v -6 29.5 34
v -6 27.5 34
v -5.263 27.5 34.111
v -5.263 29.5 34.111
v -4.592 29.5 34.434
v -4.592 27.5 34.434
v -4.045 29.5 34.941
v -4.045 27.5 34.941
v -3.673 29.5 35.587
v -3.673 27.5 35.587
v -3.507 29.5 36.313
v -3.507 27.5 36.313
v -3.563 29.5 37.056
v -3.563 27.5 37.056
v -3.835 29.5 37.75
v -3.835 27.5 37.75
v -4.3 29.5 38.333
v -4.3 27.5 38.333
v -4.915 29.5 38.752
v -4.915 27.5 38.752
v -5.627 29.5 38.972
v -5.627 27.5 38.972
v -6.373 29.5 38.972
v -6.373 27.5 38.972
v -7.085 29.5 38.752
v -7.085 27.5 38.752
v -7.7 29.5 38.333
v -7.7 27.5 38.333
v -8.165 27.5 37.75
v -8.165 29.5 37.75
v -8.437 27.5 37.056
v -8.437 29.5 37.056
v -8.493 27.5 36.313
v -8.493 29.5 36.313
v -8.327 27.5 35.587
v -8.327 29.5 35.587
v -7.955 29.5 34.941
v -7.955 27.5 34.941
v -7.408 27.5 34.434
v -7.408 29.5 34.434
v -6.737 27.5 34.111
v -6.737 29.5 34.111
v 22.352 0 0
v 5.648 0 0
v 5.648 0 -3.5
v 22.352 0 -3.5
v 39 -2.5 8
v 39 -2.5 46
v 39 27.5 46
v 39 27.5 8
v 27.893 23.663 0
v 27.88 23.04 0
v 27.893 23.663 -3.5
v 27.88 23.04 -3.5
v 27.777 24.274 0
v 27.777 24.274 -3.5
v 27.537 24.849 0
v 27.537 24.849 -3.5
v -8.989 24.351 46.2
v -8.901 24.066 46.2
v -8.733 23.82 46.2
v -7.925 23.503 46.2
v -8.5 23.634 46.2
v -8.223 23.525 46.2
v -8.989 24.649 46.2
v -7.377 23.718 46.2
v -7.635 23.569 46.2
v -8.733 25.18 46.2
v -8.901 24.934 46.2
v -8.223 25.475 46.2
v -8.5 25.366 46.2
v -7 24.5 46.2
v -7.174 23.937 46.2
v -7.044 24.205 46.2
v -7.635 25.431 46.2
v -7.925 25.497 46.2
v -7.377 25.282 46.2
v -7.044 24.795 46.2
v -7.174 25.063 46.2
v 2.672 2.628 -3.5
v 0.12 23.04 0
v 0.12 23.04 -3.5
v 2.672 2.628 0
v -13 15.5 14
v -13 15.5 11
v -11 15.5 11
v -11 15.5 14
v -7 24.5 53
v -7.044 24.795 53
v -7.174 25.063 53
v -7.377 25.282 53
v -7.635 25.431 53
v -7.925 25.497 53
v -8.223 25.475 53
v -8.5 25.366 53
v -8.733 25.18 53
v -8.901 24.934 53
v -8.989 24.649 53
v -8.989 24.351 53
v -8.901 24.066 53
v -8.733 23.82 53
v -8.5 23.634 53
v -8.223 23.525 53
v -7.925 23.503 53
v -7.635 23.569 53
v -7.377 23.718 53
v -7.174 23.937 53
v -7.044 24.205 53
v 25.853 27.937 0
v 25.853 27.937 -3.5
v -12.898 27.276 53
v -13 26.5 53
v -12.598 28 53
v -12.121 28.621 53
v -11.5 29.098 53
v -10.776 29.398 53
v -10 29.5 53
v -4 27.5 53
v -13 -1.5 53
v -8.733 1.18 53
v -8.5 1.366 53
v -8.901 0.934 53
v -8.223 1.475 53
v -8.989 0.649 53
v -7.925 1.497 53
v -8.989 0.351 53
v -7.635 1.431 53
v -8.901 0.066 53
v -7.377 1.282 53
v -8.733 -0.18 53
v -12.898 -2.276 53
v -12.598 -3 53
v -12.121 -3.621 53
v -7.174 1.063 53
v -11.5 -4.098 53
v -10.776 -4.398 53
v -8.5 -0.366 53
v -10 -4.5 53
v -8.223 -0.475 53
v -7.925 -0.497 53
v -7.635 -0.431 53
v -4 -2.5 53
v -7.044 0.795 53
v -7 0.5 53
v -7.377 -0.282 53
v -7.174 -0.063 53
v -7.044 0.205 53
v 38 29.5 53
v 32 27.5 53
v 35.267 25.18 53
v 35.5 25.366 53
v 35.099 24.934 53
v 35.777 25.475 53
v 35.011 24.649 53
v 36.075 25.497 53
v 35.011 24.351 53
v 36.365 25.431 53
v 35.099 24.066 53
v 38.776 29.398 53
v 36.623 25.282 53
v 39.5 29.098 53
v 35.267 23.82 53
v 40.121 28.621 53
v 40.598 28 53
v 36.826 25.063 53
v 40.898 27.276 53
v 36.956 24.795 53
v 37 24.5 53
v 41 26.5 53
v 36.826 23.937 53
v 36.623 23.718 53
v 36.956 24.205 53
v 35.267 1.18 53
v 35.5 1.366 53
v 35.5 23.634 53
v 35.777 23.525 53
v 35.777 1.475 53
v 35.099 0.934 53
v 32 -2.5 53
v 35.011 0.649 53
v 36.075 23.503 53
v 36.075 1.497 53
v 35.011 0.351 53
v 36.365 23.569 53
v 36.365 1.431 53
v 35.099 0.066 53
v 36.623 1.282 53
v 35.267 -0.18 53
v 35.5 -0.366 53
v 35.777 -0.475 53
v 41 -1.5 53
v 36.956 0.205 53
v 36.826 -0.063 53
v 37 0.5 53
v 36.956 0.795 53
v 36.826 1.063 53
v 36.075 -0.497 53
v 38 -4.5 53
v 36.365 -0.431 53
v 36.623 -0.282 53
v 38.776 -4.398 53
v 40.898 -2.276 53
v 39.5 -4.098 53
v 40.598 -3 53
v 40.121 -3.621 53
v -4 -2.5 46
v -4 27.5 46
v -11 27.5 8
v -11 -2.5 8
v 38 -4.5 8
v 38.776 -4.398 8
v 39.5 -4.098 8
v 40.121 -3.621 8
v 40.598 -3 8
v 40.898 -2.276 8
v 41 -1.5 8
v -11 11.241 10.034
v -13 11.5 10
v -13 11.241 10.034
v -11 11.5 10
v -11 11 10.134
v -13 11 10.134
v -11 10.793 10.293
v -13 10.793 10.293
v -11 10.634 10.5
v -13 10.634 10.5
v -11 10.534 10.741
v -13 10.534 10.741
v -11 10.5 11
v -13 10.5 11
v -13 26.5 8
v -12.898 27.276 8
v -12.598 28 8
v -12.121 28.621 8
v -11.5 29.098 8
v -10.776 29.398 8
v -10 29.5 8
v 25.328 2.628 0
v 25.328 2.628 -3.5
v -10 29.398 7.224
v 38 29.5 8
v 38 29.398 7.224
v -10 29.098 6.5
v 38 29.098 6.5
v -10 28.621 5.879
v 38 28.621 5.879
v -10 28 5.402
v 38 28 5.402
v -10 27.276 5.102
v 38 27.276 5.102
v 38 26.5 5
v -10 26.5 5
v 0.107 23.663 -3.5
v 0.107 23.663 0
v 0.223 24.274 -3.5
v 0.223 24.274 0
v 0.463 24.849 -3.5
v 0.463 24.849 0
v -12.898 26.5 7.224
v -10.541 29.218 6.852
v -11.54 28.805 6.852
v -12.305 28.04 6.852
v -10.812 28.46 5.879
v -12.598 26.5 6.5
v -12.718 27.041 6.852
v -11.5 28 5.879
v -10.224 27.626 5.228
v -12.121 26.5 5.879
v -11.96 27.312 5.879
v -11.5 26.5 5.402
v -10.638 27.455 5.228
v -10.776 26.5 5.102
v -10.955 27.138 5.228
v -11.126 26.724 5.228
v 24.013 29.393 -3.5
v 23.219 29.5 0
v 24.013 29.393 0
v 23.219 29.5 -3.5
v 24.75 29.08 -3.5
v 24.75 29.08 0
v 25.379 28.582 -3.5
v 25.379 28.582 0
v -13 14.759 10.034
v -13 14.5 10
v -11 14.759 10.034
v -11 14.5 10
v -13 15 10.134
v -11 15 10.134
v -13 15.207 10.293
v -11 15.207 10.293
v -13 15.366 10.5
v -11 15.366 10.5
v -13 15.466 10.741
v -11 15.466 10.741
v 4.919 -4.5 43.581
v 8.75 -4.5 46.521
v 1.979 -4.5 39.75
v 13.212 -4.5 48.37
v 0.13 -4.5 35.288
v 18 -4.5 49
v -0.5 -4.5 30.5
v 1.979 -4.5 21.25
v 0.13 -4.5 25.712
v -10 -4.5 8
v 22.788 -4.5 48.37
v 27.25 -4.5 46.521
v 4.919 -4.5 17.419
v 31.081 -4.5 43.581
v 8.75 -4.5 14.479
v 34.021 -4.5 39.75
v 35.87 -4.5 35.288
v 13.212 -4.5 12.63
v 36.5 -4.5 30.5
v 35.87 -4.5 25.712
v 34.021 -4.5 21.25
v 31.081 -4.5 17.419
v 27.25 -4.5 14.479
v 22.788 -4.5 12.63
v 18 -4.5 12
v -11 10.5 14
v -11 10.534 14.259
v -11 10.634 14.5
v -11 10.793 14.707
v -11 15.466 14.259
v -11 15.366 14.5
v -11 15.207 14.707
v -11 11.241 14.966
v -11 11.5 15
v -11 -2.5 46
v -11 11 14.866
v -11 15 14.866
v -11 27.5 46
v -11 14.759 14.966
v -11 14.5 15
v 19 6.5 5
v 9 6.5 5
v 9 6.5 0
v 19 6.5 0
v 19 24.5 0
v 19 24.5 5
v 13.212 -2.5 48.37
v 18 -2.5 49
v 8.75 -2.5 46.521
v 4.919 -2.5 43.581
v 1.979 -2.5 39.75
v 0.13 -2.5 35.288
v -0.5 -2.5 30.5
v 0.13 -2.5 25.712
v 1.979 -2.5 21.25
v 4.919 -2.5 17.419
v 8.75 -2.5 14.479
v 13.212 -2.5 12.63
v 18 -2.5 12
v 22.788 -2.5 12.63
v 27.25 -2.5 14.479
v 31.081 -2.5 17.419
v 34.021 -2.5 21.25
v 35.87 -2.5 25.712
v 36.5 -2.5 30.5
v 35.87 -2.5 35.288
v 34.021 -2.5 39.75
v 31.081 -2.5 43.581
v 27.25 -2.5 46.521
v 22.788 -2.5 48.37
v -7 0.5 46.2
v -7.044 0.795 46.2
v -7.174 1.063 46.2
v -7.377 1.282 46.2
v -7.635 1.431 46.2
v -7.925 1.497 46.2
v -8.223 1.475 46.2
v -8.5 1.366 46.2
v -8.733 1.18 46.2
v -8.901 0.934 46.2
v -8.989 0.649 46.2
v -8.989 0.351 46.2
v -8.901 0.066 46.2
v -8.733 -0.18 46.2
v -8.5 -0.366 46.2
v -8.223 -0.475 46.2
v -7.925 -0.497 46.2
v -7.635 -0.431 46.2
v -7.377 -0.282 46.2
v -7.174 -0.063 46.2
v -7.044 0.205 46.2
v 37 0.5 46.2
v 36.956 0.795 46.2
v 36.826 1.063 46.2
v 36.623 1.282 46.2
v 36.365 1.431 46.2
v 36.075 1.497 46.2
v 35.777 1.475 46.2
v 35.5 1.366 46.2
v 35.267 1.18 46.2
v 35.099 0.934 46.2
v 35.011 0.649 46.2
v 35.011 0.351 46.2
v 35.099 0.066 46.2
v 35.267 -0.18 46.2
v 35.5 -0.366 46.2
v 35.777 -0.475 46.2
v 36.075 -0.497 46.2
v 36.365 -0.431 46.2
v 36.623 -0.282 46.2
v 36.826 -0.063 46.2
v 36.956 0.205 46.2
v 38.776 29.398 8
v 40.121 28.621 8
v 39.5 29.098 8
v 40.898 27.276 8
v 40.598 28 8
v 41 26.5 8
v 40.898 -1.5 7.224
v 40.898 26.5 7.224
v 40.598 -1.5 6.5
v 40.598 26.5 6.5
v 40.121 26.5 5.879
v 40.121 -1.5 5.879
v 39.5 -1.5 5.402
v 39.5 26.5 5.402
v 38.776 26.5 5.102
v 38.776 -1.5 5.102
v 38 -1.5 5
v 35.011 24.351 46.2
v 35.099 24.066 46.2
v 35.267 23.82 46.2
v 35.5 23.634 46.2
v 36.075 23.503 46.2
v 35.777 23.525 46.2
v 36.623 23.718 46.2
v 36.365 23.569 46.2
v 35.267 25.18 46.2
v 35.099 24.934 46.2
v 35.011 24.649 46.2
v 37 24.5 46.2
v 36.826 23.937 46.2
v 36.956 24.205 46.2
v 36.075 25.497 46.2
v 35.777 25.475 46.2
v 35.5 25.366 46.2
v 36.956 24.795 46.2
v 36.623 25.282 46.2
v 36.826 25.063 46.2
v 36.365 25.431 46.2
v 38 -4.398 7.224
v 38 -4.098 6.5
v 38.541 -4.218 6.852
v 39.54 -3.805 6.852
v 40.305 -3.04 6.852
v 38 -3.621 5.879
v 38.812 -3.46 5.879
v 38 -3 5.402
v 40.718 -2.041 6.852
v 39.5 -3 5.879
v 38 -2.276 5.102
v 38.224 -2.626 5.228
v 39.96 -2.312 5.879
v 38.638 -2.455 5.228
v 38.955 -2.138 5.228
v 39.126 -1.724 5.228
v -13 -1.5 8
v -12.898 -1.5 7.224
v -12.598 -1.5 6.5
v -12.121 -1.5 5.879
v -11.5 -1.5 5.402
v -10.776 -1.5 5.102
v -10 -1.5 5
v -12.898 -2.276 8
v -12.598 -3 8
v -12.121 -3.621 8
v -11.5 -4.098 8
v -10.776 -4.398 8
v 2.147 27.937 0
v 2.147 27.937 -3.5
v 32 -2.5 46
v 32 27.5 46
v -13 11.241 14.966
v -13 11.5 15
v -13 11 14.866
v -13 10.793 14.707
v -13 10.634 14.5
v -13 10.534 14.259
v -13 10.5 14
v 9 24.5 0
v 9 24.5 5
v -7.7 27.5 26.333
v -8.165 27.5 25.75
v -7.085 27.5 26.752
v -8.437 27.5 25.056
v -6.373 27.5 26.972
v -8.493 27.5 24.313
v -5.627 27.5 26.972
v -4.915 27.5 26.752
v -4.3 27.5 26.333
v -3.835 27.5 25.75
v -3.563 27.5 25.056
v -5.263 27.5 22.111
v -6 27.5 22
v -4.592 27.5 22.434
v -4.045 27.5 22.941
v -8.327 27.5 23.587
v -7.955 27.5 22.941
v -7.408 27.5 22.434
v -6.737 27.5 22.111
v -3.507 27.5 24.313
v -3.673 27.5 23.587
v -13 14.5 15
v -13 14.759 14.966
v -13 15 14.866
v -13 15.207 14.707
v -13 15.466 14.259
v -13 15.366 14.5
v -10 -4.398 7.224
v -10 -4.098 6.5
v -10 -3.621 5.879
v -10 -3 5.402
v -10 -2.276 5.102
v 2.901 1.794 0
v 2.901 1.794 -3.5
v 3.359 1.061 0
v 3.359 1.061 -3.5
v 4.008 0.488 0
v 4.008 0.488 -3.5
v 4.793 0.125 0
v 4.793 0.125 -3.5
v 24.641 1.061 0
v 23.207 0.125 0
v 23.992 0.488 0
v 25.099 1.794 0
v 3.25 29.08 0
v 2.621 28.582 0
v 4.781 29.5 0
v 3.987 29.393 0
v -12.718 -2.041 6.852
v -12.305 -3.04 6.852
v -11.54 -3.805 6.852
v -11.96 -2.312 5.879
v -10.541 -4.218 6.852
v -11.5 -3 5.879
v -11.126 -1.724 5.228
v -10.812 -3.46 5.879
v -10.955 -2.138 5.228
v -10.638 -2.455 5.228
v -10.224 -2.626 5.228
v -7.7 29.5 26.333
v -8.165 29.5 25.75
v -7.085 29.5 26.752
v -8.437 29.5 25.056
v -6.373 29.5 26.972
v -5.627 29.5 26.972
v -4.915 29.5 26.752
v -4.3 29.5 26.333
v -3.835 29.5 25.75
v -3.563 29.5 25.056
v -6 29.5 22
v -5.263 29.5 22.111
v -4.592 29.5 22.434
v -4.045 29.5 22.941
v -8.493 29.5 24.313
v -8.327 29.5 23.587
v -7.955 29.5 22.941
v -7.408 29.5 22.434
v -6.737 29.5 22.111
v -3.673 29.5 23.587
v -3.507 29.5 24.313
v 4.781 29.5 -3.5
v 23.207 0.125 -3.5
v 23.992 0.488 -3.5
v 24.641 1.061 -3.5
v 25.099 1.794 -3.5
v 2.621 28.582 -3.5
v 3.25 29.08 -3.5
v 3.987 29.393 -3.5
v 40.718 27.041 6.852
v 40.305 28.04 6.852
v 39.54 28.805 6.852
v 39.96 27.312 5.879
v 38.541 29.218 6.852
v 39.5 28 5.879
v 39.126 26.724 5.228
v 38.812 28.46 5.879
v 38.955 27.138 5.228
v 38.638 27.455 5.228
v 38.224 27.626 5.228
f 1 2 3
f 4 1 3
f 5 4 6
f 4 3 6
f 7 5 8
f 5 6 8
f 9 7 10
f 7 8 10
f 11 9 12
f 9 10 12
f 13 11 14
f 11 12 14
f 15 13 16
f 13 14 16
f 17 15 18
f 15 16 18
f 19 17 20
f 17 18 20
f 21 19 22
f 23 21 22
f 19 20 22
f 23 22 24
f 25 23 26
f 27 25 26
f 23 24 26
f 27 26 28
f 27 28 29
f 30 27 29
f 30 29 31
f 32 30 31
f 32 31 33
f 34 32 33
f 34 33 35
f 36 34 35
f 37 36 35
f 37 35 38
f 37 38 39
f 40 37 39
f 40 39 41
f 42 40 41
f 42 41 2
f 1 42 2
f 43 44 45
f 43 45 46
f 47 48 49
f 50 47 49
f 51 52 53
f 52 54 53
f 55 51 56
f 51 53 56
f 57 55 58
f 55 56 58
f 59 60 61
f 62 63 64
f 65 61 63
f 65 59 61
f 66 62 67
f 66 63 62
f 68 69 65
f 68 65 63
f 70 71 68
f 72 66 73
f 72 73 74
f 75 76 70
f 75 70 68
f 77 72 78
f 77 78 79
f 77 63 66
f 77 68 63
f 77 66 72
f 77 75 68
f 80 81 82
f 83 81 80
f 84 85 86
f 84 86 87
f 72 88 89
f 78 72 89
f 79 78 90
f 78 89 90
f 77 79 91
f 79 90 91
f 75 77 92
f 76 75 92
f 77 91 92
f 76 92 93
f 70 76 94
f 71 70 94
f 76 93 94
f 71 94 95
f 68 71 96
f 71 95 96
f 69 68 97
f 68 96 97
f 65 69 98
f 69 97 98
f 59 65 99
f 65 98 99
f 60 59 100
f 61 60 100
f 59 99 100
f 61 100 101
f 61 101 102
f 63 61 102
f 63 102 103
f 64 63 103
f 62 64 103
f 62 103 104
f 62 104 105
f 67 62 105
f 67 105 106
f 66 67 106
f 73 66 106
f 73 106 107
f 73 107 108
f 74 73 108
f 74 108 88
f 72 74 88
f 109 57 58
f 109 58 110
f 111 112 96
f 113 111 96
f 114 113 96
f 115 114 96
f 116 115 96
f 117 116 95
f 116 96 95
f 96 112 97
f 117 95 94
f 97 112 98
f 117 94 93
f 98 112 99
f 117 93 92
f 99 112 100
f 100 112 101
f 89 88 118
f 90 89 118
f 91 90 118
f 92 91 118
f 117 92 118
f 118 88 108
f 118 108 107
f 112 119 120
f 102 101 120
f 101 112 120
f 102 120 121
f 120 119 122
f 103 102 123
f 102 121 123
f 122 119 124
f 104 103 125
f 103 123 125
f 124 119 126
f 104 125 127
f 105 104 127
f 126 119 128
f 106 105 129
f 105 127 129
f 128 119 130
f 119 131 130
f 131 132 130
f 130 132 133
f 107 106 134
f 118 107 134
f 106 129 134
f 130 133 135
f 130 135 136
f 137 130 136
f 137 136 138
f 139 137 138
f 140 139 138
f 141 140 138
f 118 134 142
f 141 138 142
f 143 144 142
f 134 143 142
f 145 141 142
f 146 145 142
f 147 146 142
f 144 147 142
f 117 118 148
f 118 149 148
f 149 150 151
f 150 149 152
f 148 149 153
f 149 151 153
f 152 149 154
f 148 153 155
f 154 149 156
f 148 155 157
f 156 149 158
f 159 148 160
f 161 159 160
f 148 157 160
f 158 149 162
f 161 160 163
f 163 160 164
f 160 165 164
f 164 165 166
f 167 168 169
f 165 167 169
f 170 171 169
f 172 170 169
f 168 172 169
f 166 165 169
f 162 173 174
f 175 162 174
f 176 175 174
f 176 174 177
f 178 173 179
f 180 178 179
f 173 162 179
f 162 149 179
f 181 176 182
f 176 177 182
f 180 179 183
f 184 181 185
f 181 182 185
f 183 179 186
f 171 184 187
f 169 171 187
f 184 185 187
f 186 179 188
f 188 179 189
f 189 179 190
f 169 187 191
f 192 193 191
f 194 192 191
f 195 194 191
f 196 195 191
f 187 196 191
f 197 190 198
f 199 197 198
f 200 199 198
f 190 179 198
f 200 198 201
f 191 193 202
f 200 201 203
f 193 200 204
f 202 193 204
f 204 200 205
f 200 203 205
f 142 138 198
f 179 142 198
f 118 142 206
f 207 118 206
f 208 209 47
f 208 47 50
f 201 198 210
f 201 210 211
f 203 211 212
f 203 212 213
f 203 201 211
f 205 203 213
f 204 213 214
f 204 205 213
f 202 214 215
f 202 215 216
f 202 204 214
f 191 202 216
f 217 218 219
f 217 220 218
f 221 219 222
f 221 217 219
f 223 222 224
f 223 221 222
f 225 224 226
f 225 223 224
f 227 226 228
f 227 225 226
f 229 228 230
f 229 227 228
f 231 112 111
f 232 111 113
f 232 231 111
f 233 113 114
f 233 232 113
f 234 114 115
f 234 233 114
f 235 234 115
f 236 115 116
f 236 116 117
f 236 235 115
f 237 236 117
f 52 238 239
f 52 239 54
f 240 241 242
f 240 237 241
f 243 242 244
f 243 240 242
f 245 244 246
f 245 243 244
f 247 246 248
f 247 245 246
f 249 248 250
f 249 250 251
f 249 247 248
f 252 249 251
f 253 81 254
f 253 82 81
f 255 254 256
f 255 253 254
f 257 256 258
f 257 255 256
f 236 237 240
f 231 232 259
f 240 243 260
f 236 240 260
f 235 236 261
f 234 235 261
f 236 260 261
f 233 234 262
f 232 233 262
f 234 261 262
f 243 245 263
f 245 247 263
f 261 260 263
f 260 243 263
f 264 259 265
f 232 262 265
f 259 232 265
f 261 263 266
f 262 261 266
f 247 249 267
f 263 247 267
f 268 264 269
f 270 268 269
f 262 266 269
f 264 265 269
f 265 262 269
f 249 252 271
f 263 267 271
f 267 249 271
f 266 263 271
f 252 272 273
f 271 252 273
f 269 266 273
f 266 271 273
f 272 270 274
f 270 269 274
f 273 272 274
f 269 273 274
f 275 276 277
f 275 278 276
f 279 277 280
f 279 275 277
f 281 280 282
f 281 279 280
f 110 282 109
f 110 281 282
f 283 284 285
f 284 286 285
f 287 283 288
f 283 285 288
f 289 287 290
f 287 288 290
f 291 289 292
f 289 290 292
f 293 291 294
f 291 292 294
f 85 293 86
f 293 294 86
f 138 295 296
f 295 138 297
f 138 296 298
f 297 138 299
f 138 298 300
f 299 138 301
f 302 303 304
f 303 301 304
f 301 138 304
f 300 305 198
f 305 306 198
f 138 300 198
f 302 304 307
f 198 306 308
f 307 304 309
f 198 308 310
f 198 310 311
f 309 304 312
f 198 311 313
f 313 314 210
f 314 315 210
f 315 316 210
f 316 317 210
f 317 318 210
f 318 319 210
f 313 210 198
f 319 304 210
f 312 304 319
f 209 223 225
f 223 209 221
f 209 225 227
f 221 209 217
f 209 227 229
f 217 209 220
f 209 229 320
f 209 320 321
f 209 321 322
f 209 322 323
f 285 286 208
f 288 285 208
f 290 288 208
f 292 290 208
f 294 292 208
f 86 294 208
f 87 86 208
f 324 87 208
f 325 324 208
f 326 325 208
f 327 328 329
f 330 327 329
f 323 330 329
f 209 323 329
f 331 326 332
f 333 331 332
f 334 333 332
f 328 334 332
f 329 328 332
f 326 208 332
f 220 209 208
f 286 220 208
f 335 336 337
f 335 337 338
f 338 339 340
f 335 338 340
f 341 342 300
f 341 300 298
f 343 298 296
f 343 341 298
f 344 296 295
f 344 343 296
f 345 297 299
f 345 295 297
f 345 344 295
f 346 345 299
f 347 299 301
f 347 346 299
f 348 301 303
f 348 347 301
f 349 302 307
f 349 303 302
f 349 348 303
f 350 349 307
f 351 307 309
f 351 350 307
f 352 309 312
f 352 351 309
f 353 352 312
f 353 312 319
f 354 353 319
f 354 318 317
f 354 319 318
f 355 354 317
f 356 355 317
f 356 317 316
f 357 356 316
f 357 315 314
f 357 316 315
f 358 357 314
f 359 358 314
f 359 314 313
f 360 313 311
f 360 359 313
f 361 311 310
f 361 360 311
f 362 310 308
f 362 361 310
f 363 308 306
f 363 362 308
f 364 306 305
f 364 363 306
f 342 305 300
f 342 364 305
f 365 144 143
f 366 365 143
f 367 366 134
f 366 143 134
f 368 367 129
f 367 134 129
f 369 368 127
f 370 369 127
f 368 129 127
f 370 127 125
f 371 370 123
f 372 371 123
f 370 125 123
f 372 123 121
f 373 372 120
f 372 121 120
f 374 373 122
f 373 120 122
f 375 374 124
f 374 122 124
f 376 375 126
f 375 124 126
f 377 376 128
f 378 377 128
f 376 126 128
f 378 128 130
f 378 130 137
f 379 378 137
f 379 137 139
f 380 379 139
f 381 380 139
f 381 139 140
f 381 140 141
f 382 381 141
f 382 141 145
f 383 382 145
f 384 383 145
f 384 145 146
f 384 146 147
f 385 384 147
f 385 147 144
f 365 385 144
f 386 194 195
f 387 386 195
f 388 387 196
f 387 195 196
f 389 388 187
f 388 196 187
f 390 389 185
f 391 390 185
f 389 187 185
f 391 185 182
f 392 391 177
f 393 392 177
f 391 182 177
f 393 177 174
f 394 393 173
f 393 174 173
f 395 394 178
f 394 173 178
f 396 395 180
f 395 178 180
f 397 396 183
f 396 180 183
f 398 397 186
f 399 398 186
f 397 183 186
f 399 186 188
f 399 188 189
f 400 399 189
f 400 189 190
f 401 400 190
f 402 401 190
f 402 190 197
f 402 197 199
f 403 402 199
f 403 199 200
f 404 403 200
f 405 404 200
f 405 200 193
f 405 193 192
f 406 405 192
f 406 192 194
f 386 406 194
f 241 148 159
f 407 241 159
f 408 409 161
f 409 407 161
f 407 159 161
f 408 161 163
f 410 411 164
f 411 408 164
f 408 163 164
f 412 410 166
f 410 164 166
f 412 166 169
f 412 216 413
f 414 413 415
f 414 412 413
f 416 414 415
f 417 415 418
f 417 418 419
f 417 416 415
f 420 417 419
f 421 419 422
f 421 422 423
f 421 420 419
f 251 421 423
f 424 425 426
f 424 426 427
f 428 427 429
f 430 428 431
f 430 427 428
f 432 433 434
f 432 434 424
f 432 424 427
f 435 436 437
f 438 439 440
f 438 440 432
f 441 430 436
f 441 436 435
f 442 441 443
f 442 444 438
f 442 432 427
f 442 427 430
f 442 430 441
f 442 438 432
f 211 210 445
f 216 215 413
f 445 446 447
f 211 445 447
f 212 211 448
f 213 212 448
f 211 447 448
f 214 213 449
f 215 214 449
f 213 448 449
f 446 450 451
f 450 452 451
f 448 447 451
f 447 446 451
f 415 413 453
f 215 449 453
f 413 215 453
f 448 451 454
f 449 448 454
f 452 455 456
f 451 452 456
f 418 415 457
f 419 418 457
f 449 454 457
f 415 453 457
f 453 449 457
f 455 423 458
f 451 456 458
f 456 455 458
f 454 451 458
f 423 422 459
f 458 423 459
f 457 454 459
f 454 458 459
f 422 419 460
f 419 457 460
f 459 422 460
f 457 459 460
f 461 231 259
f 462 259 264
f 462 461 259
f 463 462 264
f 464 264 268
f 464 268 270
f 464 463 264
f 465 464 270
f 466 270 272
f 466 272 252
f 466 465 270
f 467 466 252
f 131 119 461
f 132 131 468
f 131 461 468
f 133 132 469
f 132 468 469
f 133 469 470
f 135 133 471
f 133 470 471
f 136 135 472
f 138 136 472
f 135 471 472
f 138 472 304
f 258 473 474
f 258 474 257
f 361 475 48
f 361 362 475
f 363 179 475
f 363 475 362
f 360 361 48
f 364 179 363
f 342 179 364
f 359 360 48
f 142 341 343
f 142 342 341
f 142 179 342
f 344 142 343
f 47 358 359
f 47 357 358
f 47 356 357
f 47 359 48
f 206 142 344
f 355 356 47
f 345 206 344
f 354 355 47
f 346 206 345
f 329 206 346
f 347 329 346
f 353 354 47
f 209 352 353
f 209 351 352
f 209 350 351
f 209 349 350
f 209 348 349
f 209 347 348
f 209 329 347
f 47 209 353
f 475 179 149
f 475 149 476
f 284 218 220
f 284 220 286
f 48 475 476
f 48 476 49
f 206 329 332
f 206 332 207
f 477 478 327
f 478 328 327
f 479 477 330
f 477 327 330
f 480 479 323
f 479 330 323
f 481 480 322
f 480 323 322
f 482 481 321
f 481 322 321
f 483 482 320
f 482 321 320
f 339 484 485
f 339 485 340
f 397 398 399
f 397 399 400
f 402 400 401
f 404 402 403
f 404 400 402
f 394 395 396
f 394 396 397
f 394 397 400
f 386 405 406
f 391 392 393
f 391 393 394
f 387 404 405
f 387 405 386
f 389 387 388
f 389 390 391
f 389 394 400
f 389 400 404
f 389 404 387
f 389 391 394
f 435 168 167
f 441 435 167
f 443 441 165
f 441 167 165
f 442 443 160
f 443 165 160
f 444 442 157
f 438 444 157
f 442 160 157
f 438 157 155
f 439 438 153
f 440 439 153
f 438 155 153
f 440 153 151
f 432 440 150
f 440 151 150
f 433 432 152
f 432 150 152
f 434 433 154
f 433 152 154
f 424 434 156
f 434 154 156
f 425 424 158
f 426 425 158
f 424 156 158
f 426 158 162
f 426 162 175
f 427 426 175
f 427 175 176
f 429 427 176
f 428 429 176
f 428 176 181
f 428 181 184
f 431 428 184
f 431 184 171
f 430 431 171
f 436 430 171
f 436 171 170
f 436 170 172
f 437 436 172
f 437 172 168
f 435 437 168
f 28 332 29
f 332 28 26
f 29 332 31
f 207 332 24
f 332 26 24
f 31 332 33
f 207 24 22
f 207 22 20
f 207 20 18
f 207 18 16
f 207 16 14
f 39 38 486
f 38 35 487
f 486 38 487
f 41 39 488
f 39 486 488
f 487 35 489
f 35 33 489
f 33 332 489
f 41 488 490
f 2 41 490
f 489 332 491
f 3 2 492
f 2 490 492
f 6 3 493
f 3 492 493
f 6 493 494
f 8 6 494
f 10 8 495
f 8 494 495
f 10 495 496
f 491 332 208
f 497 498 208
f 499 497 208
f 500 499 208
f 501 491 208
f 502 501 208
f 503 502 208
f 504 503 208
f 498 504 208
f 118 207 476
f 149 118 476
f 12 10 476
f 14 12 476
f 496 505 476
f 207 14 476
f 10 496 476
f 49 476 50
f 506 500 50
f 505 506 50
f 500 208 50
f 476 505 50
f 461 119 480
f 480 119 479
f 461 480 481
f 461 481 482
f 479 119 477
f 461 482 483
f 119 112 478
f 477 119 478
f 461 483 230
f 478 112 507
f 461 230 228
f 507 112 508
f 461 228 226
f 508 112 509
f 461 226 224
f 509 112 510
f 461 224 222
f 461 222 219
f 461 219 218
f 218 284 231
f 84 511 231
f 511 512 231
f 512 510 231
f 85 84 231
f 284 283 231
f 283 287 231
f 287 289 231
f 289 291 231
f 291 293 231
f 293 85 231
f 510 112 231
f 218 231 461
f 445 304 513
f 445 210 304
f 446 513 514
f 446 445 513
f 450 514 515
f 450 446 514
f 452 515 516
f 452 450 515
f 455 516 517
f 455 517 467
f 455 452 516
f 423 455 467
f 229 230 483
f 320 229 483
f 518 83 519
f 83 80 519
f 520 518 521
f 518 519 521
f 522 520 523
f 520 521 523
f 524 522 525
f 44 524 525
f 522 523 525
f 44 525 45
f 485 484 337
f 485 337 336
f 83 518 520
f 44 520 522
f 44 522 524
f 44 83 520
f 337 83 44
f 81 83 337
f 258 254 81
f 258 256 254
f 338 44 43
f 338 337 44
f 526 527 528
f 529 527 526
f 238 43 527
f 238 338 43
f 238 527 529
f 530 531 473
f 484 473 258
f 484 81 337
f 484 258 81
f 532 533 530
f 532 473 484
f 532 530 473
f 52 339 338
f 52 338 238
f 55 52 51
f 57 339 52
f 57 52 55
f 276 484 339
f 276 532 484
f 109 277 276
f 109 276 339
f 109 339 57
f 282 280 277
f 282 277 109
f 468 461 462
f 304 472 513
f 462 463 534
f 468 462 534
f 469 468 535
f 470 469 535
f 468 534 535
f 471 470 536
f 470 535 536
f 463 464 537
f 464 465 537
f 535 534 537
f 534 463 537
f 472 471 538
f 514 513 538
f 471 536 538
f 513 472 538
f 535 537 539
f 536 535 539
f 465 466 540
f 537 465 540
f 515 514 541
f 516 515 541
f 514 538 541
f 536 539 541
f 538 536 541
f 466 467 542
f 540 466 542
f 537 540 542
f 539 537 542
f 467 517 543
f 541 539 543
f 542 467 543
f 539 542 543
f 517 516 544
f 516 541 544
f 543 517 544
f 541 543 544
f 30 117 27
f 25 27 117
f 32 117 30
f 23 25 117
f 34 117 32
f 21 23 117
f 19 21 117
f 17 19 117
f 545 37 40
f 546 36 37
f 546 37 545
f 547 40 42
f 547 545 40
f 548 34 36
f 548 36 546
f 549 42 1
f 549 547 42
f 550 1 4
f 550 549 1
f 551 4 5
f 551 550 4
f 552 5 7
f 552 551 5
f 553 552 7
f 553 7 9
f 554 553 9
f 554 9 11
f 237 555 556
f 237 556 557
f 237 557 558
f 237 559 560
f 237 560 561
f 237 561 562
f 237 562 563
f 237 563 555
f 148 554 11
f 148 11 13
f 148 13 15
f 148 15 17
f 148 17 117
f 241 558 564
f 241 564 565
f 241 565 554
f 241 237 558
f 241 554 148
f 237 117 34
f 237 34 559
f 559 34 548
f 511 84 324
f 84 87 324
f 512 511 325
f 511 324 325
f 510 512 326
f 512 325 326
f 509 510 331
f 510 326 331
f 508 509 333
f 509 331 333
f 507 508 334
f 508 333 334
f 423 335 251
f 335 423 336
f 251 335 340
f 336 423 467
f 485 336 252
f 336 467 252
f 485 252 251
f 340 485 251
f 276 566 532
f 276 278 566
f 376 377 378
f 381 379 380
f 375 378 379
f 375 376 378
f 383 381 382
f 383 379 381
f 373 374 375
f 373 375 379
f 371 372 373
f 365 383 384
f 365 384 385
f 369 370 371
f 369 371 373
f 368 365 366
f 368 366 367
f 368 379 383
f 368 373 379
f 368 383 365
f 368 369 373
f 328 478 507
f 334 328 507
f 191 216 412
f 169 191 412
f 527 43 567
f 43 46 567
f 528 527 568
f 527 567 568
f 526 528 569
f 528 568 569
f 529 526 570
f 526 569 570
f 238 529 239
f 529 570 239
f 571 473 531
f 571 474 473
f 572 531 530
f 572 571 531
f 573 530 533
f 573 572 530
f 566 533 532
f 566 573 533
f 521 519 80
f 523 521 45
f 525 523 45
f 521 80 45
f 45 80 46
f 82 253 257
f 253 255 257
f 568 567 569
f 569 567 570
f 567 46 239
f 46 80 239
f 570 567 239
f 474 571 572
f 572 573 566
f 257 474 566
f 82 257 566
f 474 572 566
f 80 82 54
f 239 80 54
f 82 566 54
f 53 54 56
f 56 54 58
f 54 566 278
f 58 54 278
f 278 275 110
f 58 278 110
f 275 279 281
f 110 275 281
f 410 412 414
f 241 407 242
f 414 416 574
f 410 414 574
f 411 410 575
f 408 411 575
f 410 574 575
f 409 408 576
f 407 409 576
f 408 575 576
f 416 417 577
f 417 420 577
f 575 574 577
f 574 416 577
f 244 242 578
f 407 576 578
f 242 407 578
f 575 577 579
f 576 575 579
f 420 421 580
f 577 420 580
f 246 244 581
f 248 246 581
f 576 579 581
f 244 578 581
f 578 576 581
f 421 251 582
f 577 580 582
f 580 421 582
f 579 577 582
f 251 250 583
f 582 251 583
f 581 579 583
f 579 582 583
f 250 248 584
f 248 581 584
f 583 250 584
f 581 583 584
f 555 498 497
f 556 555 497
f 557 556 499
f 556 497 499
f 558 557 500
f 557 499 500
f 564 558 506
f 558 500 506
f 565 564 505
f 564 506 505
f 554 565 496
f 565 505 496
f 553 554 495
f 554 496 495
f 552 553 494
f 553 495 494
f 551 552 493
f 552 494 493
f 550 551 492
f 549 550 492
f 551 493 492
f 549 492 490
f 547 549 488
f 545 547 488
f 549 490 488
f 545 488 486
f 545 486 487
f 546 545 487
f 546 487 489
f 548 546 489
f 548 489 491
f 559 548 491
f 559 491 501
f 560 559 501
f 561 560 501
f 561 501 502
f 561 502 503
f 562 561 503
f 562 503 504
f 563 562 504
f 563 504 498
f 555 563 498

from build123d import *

# Parameters (mm, degrees)
BOSS_EXTRUDE1_DEPTH  = 3.5
SKETCH2_W            = 10
SKETCH2_H            = 3
BOSS_EXTRUDE2_DEPTH  = 5
SKETCH3_W            = 50
SKETCH3_H            = 24
BOSS_EXTRUDE3_DEPTH  = 3
SKETCH4_W            = 50
SKETCH4_H            = 3
BOSS_EXTRUDE4_DEPTH  = 35
SKETCH5_W            = 4
SKETCH5_H            = 29
CUT_EXTRUDE3_DEPTH   = 35
FILLET1_R            = 2
SKETCH6_R            = 3.175
BOSS_EXTRUDE6_DEPTH  = 35
FILLET2_R            = 3
SKETCH8_W            = 10
SKETCH8_H            = 5
BOSS_EXTRUDE7_DEPTH  = 10
SKETCH9_W            = 10
SKETCH9_H            = 5
BOSS_EXTRUDE8_DEPTH  = 10
SKETCH10_W           = 53.514300768
SKETCH10_H           = 42.489179877
CUT_EXTRUDE4_DEPTH   = 20
BOSS_EXTRUDE9_DEPTH  = 40
SKETCH13_W           = 40
SKETCH13_H           = 10
BOSS_EXTRUDE10_DEPTH = 20
SKETCH14_W           = 4
SKETCH14_H           = 20
CUT_EXTRUDE7_DEPTH   = 20
FILLET3_R            = 2
SKETCH16_W           = 40
SKETCH16_H           = 10
CUT_EXTRUDE9_DEPTH   = 4
SKETCH19_W           = 40
SKETCH19_H           = 10
CUT_EXTRUDE10_DEPTH  = 24
SKETCH20_W           = 4
SKETCH20_H           = 2
CUT_EXTRUDE11_DEPTH  = 44
FILLET4_R            = 10
SKETCH21_W           = 58
SKETCH21_H           = 24
BOSS_EXTRUDE11_DEPTH = 2
SKETCH22_W           = 54.310686521
SKETCH22_H           = 40
CUT_EXTRUDE14_DEPTH  = 57
SKETCH24_W           = 10
SKETCH24_H           = 5
CUT_EXTRUDE15_DEPTH  = 5
SKETCH25_W           = 52
SKETCH25_H           = 2
BOSS_EXTRUDE12_DEPTH = 45
SKETCH26_W           = 2
SKETCH26_H           = 45
BOSS_EXTRUDE13_DEPTH = 22
SKETCH27_R           = 2.5
CUT_EXTRUDE16_DEPTH  = 45
SKETCH29_W           = 2
SKETCH29_H           = 45
BOSS_EXTRUDE14_DEPTH = 10
SKETCH30_W           = 45
SKETCH30_H           = 2
BOSS_EXTRUDE15_DEPTH = 50
SKETCH31_R           = 18.5
CUT_EXTRUDE17_DEPTH  = 60
SKETCH32_W           = 3
SKETCH32_H           = 34
BOSS_EXTRUDE17_DEPTH = 2
SKETCH33_W           = 2
SKETCH33_H           = 34
BOSS_EXTRUDE18_DEPTH = 45
BOSS_EXTRUDE20_REACH = 76.256
SKETCH37_W           = 7
SKETCH37_H           = 7
SKETCH38_R           = 1
CUT_EXTRUDE18_DEPTH  = 16
FILLET5_R            = 3
FILLET6_R            = 3
SKETCH39_W           = 5
SKETCH39_H           = 5
CUT_EXTRUDE22_DEPTH  = 10
FILLET7_R            = 1
SKETCH40_W           = 7
SKETCH40_H           = 30
BOSS_EXTRUDE21_DEPTH = 0.2


# Some blends are built 0.0001 mm under size
with BuildPart() as part:
    # Sketch1 → Boss-Extrude1 (new body)
    with BuildSketch(Plane.XY):
        Polygon((0, 24), (3, 0), (25, 0), (28, 24), (25, 29.5), (3, 29.5), align=None)
    extrude(amount=-BOSS_EXTRUDE1_DEPTH)

    # Sketch2 → Boss-Extrude2 (add)
    with BuildSketch(Plane.XY):
        with Locations((14, 18)):
            Rectangle(SKETCH2_W, SKETCH2_H)
    extrude(amount=BOSS_EXTRUDE2_DEPTH)

    # Sketch3 → Boss-Extrude3 (add)
    with BuildSketch(Plane.XY.offset(5)):
        with Locations((14, 17.5)):
            Rectangle(SKETCH3_W, SKETCH3_H)
    extrude(amount=BOSS_EXTRUDE3_DEPTH)

    # Sketch4 → Boss-Extrude4 (add)
    with BuildSketch(Plane.XY.offset(8)):
        with Locations((14, 28)):
            Rectangle(SKETCH4_W, SKETCH4_H)
    extrude(amount=BOSS_EXTRUDE4_DEPTH)

    # Sketch5 → Cut-Extrude3 (cut)
    with BuildSketch(Plane(origin=(0, 29.5, 0), x_dir=(1, 0, 0), z_dir=(0, 1, 0))):
        with Locations((-6, -25.5)):
            Rectangle(SKETCH5_W, SKETCH5_H)
    extrude(amount=-CUT_EXTRUDE3_DEPTH, mode=Mode.SUBTRACT)

    # Fillet1
    fillet1_edges = [part.edges().sort_by_distance(p)[0] for p in [
        (-8, 28, 40),
        (-4, 28, 40),
        (-4, 28, 11),
        (-8, 28, 11),
    ]]
    fillet(fillet1_edges, radius=FILLET1_R - 0.0001)  # a hair under: the kernel refuses the full size

    # Sketch6 → Boss-Extrude6 (add)
    with BuildSketch(Plane(origin=(39, 0, 0), x_dir=(0, 0, -1), z_dir=(1, 0, 0))):
        with BuildLine():
            Line((-29.274917218, 38.5), (-43, 29.5))
            Line((-43, 29.5), (-5, 29.5))
            Line((-5, 29.5), (-21.725082782, 38.5))
            ThreePointArc((-21.725082782, 38.5), (-25.5, 40), (-29.274917218, 38.5))
        make_face()
        with Locations((-25.5, 34.5)):
            Circle(SKETCH6_R, mode=Mode.SUBTRACT)
    extrude(amount=-BOSS_EXTRUDE6_DEPTH)

    # Fillet2
    fillet2_edges = [part.edges().sort_by_distance(p)[0] for p in [
        (25, 0, -1.75),
        (3, 0, -1.75),
        (0, 24, -1.75),
        (3, 29.5, -1.75),
        (25, 29.5, -1.75),
        (28, 24, -1.75),
    ]]
    fillet(fillet2_edges, radius=FILLET2_R)

    # Sketch8 → Boss-Extrude7 (add)
    with BuildSketch(Plane(origin=(0, 19.5, 0), x_dir=(1, 0, 0), z_dir=(0, 1, 0))):
        with Locations((14, -2.5)):
            Rectangle(SKETCH8_W, SKETCH8_H)
    extrude(amount=BOSS_EXTRUDE7_DEPTH)

    # Sketch9 → Boss-Extrude8 (add)
    with BuildSketch(Plane.XZ.offset(-16.5)):
        with Locations((14, 2.5)):
            Rectangle(SKETCH9_W, SKETCH9_H)
    extrude(amount=BOSS_EXTRUDE8_DEPTH)

    # Sketch10 → Cut-Extrude4 (cut)
    with BuildSketch(Plane(origin=(0, 29.5, 0), x_dir=(1, 0, 0), z_dir=(0, 1, 0))):
        with Locations((30.757150384, -26.244589939)):
            Rectangle(SKETCH10_W, SKETCH10_H)
    extrude(amount=CUT_EXTRUDE4_DEPTH, mode=Mode.SUBTRACT)

    # Sketch11 → Boss-Extrude9 (add)
    with BuildSketch(Plane(origin=(39, 0, 0), x_dir=(0, 0, -1), z_dir=(1, 0, 0))):
        with BuildLine():
            Line((-43, 39.5), (-43, 29.5))
            Line((-43, 29.5), (-24, 29.5))
            Line((-24, 29.5), (-24, 34.5))
            ThreePointArc((-24, 34.5), (-27.535533906, 35.964466094), (-29, 39.5))
            Line((-29, 39.5), (-43, 39.5))
        make_face()
        with BuildLine():
            Line((-24, 34.5), (-24, 29.5))
            Line((-24, 29.5), (-5, 29.5))
            Line((-5, 29.5), (-5, 39.5))
            Line((-5, 39.5), (-19, 39.5))
            ThreePointArc((-19, 39.5), (-20.464466094, 35.964466094), (-24, 34.5))
        make_face()
    extrude(amount=-BOSS_EXTRUDE9_DEPTH)

    # Sketch13 → Boss-Extrude10 (add)
    with BuildSketch(Plane.XY.offset(43)):
        with Locations((19, 34.5)):
            Rectangle(SKETCH13_W, SKETCH13_H)
        Polygon((-1, 29.5), (-11, 29.5), (-11, 26.5), (39, 26.5), (39, 29.5), align=None)
    extrude(amount=BOSS_EXTRUDE10_DEPTH)

    # Sketch14 → Cut-Extrude7 (cut)
    with BuildSketch(Plane(origin=(0, 29.5, 0), x_dir=(1, 0, 0), z_dir=(0, 1, 0))):
        with Locations((-6, -48)):
            Rectangle(SKETCH14_W, SKETCH14_H)
    extrude(amount=-CUT_EXTRUDE7_DEPTH, mode=Mode.SUBTRACT)

    # Fillet3
    fillet3_edges = [part.edges().sort_by_distance(p)[0] for p in [
        (-8, 28, 58),
        (-4, 28, 58),
    ]]
    fillet(fillet3_edges, radius=FILLET3_R - 0.0001)  # a hair under: the kernel refuses the full size

    # Sketch16 → Cut-Extrude9 (cut)
    with BuildSketch(Plane(origin=(0, 0, 5), x_dir=(-1, 0, 0), z_dir=(0, 0, -1))):
        with Locations((-19, 34.5)):
            Rectangle(SKETCH16_W, SKETCH16_H)
    extrude(amount=-CUT_EXTRUDE9_DEPTH, mode=Mode.SUBTRACT)

    # Sketch19 → Cut-Extrude10 (cut)
    with BuildSketch(Plane.XY.offset(63)):
        with Locations((19, 34.5)):
            Rectangle(SKETCH19_W, SKETCH19_H)
    extrude(amount=-CUT_EXTRUDE10_DEPTH, mode=Mode.SUBTRACT)

    # Sketch20 → Cut-Extrude11 (cut)
    with BuildSketch(Plane.XY.offset(39)):
        with Locations((6, 31.5)):
            Rectangle(SKETCH20_W, SKETCH20_H)
        with Locations((32, 31.5)):
            Rectangle(SKETCH20_W, SKETCH20_H)
    extrude(amount=-CUT_EXTRUDE11_DEPTH, mode=Mode.SUBTRACT)

    # Fillet4
    # the kernel refuses this fillet: 10 mm, written as the material it takes off along each edge
    with BuildSketch(Plane(origin=(-26, 39.5, 9), x_dir=(0, 0, 1), z_dir=(1, 0, 0)), Plane(origin=(-26, 39.5, 39), x_dir=(0, -1, 0), z_dir=(1, 0, 0))) as fillet4_piece_1:
        with BuildLine():
            CenterArc((FILLET4_R, FILLET4_R), FILLET4_R, 180, 90)
            Line((0, FILLET4_R), (0, 0))
            Line((0, 0), (FILLET4_R, 0))
        make_face()
    extrude(amount=90, mode=Mode.SUBTRACT)

    # Sketch21 → Boss-Extrude11 (add)
    with BuildSketch(Plane.ZY.offset(11)):
        with Locations((34, 17.5)):
            Rectangle(SKETCH21_W, SKETCH21_H)
    extrude(amount=BOSS_EXTRUDE11_DEPTH)

    # Sketch22 → Cut-Extrude14 (cut)
    with BuildSketch(Plane.XY.offset(65)):
        with Locations((13.590652361, 21.5)):
            Rectangle(SKETCH22_W, SKETCH22_H)
    extrude(amount=-CUT_EXTRUDE14_DEPTH, mode=Mode.SUBTRACT)

    # Sketch24 → Cut-Extrude15 (cut)
    with BuildSketch(Plane(origin=(0, 29.5, 0), x_dir=(1, 0, 0), z_dir=(0, 1, 0))):
        with Locations((14, -2.5)):
            Rectangle(SKETCH24_W, SKETCH24_H)
    extrude(amount=-CUT_EXTRUDE15_DEPTH, mode=Mode.SUBTRACT)

    # Sketch25 → Boss-Extrude12 (add)
    with BuildSketch(Plane.XY.offset(8)):
        with Locations((13, 28.5)):
            Rectangle(SKETCH25_W, SKETCH25_H)
    extrude(amount=BOSS_EXTRUDE12_DEPTH)

    # Sketch26 → Boss-Extrude13 (add)
    with BuildSketch(Plane.XZ.offset(-27.5)):
        with Locations((-12, 30.5)):
            Rectangle(SKETCH26_W, SKETCH26_H)
    extrude(amount=BOSS_EXTRUDE13_DEPTH)

    # Sketch27 → Cut-Extrude16 (cut)
    with BuildSketch(Plane.XZ.offset(-27.5)):
        with Locations(Location((-6, 36.5, 0), (0, 0, 270))):
            Circle(SKETCH27_R)
        with Locations(Location((-6, 24.5, 0), (0, 0, 270))):
            Circle(SKETCH27_R)
    extrude(amount=-CUT_EXTRUDE16_DEPTH, mode=Mode.SUBTRACT)

    # Sketch29 → Boss-Extrude14 (add)
    with BuildSketch(Plane.XZ.offset(-5.5)):
        with Locations((-12, 30.5)):
            Rectangle(SKETCH29_W, SKETCH29_H)
        Polygon((-11, 8), (-13, 8), (-13, 5), (39, 5), (39, 8), align=None)
    extrude(amount=BOSS_EXTRUDE14_DEPTH)

    # Sketch30 → Boss-Extrude15 (add)
    with BuildSketch(Plane(origin=(-11, 0, 0), x_dir=(0, 0, -1), z_dir=(1, 0, 0))):
        with Locations((-30.5, -3.5)):
            Rectangle(SKETCH30_W, SKETCH30_H)
    extrude(amount=BOSS_EXTRUDE15_DEPTH)

    # Sketch31 → Cut-Extrude17 (cut)
    with BuildSketch(Plane.XZ.offset(-27.5)):
        with Locations(Location((18, 30.5, 0), (0, 0, 90))):
            Circle(SKETCH31_R)
    extrude(amount=CUT_EXTRUDE17_DEPTH, mode=Mode.SUBTRACT)

    # Sketch32 → Boss-Extrude17 (add)
    with BuildSketch(Plane(origin=(39, 0, 0), x_dir=(0, 0, -1), z_dir=(1, 0, 0))):
        with Locations((-6.5, 12.5)):
            Rectangle(SKETCH32_W, SKETCH32_H)
    extrude(amount=BOSS_EXTRUDE17_DEPTH)

    # Sketch33 → Boss-Extrude18 (add)
    with BuildSketch(Plane.XY.offset(8)):
        with Locations((40, 12.5)):
            Rectangle(SKETCH33_W, SKETCH33_H)
    extrude(amount=BOSS_EXTRUDE18_DEPTH)

    # Sketch37 → Boss-Extrude20 (add, up to next)
    with BuildSketch(Plane(origin=(0, -2.5, 0), x_dir=(1, 0, 0), z_dir=(0, 1, 0)), mode=Mode.PRIVATE) as boss_extrude20_sk1:
        with Locations((-7.5, -49.5)):
            Rectangle(SKETCH37_W, SKETCH37_H)
    boss_extrude20_tool1 = extrude(boss_extrude20_sk1.sketch, amount=BOSS_EXTRUDE20_REACH, mode=Mode.PRIVATE) - part.part
    # Sketch37 → Boss-Extrude20 (add, up to next)
    with BuildSketch(Plane(origin=(0, -2.5, 0), x_dir=(1, 0, 0), z_dir=(0, 1, 0)), mode=Mode.PRIVATE) as boss_extrude20_sk2:
        with Locations((35.5, -49.5)):
            Rectangle(SKETCH37_W, SKETCH37_H)
    boss_extrude20_tool2 = extrude(boss_extrude20_sk2.sketch, amount=BOSS_EXTRUDE20_REACH, mode=Mode.PRIVATE) - part.part
    add(boss_extrude20_tool1.solids().sort_by_distance((-7.5, -2.5, 49.5))[0])
    add(boss_extrude20_tool2.solids().sort_by_distance((35.5, -2.5, 49.5))[0])

    # Sketch38 → Cut-Extrude18 (cut)
    with BuildSketch(Plane.XY.offset(53)):
        with Locations((-8, 24.5)):
            Circle(SKETCH38_R)
        with Locations((-8, 0.5)):
            Circle(SKETCH38_R)
        with Locations((36, 24.5)):
            Circle(SKETCH38_R)
        with Locations((36, 0.5)):
            Circle(SKETCH38_R)
    extrude(amount=-CUT_EXTRUDE18_DEPTH, mode=Mode.SUBTRACT)

    # Fillet5
    fillet5_edges = [part.edges().sort_by_distance(p)[0] for p in [
        (-13, 29.5, 29),
        (-13, -4.5, 29),
        (41, 29.5, 29),
        (41, -4.5, 29),
    ]]
    fillet(fillet5_edges, radius=FILLET5_R)

    # Fillet6
    fillet6_edges = [part.edges().sort_by_distance(p)[0] for p in [
        (14, -4.5, 5),
        (14, 29.5, 5),
        (41, 12.5, 5),
        (-13, 12.5, 5),
        (40.121320344, 28.621320344, 5),
        (40.121320344, -3.621320344, 5),
        (-12.121320344, 28.621320344, 5),
        (-12.121320344, -3.621320344, 5),
    ]]
    fillet(fillet6_edges, radius=FILLET6_R)

    # Sketch39 → Cut-Extrude22 (cut)
    with BuildSketch(Plane.ZY.offset(13)):
        with Locations((12.5, 13)):
            Rectangle(SKETCH39_W, SKETCH39_H)
    extrude(amount=-CUT_EXTRUDE22_DEPTH, mode=Mode.SUBTRACT)

    # Fillet7
    fillet7_edges = [part.edges().sort_by_distance(p)[0] for p in [
        (-12, 10.5, 10),
        (-12, 15.5, 10),
        (-12, 15.5, 15),
        (-12, 10.5, 15),
    ]]
    fillet(fillet7_edges, radius=FILLET7_R)

    # Sketch40 → Boss-Extrude21 (add)
    with BuildSketch(Plane.XY.offset(46)):
        with Locations((-7.5, 12.5)):
            Rectangle(SKETCH40_W, SKETCH40_H)
        with Locations((35.5, 12.5)):
            Rectangle(SKETCH40_W, SKETCH40_H)
    extrude(amount=BOSS_EXTRUDE21_DEPTH)


solid = part.part
